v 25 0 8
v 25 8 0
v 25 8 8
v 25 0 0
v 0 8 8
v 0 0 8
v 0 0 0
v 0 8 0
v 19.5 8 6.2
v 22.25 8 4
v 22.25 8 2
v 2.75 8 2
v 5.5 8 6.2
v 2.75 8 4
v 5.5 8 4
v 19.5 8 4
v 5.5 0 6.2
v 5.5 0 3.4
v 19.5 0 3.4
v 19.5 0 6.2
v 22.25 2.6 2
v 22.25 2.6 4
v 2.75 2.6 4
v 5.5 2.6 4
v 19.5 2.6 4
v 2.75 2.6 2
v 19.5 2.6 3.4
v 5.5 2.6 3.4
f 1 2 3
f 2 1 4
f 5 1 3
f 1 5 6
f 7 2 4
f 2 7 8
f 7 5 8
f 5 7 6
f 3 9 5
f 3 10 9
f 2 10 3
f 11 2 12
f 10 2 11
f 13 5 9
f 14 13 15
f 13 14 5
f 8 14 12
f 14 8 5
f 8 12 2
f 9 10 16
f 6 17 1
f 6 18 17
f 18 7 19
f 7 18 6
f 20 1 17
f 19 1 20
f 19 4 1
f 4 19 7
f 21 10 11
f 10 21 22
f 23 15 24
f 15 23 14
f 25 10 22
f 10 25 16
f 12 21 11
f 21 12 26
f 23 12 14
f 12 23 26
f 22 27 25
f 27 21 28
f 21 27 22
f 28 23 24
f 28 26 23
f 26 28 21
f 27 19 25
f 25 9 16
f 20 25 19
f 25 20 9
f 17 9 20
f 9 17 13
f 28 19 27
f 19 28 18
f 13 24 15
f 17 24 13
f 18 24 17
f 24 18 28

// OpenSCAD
/**
 *  ================================================================
 *  ================= PROTOTYPE NOT FINISHED PIECE =================
 *  ================================================================
 */

// card width 18mm
// card z 1.9mm

// card metal with 14mm
// card metal z 2mm

// metal / card offset 2.7mm

module sdcardHolderPiece() {

    box_x_size = 25;
    box_y_size = 8;
    box_z_size = 8;

    card_x_size = 19.5;
    card_z_size = 2;
    

    card_metal_x_size = 14;
    card_metal_z_size = 2.2;

    metal_offset = 2.6;
    metal_z_offset = 0.6;



    difference() {
        color("grey", 0.8)
            cube([box_x_size, box_y_size, box_z_size], center = false);


            // card
            translate([
                box_x_size / 2 - card_x_size / 2,
                metal_offset,
                box_z_size / 2 - card_z_size
            ])
                cube([card_x_size, 20, card_z_size], center = false);


            // Metal
            translate([
                box_x_size / 2 - card_metal_x_size / 2,
                -1,
                box_z_size / 2 - metal_z_offset
            ])
                cube([card_metal_x_size, 20, card_metal_z_size + metal_z_offset], center = false);

    }

}

/**
 * @stl
 * @png
 * @colorscheme BeforeDawn
 * @view axes,scales
 */
sdcardHolderPiece();
